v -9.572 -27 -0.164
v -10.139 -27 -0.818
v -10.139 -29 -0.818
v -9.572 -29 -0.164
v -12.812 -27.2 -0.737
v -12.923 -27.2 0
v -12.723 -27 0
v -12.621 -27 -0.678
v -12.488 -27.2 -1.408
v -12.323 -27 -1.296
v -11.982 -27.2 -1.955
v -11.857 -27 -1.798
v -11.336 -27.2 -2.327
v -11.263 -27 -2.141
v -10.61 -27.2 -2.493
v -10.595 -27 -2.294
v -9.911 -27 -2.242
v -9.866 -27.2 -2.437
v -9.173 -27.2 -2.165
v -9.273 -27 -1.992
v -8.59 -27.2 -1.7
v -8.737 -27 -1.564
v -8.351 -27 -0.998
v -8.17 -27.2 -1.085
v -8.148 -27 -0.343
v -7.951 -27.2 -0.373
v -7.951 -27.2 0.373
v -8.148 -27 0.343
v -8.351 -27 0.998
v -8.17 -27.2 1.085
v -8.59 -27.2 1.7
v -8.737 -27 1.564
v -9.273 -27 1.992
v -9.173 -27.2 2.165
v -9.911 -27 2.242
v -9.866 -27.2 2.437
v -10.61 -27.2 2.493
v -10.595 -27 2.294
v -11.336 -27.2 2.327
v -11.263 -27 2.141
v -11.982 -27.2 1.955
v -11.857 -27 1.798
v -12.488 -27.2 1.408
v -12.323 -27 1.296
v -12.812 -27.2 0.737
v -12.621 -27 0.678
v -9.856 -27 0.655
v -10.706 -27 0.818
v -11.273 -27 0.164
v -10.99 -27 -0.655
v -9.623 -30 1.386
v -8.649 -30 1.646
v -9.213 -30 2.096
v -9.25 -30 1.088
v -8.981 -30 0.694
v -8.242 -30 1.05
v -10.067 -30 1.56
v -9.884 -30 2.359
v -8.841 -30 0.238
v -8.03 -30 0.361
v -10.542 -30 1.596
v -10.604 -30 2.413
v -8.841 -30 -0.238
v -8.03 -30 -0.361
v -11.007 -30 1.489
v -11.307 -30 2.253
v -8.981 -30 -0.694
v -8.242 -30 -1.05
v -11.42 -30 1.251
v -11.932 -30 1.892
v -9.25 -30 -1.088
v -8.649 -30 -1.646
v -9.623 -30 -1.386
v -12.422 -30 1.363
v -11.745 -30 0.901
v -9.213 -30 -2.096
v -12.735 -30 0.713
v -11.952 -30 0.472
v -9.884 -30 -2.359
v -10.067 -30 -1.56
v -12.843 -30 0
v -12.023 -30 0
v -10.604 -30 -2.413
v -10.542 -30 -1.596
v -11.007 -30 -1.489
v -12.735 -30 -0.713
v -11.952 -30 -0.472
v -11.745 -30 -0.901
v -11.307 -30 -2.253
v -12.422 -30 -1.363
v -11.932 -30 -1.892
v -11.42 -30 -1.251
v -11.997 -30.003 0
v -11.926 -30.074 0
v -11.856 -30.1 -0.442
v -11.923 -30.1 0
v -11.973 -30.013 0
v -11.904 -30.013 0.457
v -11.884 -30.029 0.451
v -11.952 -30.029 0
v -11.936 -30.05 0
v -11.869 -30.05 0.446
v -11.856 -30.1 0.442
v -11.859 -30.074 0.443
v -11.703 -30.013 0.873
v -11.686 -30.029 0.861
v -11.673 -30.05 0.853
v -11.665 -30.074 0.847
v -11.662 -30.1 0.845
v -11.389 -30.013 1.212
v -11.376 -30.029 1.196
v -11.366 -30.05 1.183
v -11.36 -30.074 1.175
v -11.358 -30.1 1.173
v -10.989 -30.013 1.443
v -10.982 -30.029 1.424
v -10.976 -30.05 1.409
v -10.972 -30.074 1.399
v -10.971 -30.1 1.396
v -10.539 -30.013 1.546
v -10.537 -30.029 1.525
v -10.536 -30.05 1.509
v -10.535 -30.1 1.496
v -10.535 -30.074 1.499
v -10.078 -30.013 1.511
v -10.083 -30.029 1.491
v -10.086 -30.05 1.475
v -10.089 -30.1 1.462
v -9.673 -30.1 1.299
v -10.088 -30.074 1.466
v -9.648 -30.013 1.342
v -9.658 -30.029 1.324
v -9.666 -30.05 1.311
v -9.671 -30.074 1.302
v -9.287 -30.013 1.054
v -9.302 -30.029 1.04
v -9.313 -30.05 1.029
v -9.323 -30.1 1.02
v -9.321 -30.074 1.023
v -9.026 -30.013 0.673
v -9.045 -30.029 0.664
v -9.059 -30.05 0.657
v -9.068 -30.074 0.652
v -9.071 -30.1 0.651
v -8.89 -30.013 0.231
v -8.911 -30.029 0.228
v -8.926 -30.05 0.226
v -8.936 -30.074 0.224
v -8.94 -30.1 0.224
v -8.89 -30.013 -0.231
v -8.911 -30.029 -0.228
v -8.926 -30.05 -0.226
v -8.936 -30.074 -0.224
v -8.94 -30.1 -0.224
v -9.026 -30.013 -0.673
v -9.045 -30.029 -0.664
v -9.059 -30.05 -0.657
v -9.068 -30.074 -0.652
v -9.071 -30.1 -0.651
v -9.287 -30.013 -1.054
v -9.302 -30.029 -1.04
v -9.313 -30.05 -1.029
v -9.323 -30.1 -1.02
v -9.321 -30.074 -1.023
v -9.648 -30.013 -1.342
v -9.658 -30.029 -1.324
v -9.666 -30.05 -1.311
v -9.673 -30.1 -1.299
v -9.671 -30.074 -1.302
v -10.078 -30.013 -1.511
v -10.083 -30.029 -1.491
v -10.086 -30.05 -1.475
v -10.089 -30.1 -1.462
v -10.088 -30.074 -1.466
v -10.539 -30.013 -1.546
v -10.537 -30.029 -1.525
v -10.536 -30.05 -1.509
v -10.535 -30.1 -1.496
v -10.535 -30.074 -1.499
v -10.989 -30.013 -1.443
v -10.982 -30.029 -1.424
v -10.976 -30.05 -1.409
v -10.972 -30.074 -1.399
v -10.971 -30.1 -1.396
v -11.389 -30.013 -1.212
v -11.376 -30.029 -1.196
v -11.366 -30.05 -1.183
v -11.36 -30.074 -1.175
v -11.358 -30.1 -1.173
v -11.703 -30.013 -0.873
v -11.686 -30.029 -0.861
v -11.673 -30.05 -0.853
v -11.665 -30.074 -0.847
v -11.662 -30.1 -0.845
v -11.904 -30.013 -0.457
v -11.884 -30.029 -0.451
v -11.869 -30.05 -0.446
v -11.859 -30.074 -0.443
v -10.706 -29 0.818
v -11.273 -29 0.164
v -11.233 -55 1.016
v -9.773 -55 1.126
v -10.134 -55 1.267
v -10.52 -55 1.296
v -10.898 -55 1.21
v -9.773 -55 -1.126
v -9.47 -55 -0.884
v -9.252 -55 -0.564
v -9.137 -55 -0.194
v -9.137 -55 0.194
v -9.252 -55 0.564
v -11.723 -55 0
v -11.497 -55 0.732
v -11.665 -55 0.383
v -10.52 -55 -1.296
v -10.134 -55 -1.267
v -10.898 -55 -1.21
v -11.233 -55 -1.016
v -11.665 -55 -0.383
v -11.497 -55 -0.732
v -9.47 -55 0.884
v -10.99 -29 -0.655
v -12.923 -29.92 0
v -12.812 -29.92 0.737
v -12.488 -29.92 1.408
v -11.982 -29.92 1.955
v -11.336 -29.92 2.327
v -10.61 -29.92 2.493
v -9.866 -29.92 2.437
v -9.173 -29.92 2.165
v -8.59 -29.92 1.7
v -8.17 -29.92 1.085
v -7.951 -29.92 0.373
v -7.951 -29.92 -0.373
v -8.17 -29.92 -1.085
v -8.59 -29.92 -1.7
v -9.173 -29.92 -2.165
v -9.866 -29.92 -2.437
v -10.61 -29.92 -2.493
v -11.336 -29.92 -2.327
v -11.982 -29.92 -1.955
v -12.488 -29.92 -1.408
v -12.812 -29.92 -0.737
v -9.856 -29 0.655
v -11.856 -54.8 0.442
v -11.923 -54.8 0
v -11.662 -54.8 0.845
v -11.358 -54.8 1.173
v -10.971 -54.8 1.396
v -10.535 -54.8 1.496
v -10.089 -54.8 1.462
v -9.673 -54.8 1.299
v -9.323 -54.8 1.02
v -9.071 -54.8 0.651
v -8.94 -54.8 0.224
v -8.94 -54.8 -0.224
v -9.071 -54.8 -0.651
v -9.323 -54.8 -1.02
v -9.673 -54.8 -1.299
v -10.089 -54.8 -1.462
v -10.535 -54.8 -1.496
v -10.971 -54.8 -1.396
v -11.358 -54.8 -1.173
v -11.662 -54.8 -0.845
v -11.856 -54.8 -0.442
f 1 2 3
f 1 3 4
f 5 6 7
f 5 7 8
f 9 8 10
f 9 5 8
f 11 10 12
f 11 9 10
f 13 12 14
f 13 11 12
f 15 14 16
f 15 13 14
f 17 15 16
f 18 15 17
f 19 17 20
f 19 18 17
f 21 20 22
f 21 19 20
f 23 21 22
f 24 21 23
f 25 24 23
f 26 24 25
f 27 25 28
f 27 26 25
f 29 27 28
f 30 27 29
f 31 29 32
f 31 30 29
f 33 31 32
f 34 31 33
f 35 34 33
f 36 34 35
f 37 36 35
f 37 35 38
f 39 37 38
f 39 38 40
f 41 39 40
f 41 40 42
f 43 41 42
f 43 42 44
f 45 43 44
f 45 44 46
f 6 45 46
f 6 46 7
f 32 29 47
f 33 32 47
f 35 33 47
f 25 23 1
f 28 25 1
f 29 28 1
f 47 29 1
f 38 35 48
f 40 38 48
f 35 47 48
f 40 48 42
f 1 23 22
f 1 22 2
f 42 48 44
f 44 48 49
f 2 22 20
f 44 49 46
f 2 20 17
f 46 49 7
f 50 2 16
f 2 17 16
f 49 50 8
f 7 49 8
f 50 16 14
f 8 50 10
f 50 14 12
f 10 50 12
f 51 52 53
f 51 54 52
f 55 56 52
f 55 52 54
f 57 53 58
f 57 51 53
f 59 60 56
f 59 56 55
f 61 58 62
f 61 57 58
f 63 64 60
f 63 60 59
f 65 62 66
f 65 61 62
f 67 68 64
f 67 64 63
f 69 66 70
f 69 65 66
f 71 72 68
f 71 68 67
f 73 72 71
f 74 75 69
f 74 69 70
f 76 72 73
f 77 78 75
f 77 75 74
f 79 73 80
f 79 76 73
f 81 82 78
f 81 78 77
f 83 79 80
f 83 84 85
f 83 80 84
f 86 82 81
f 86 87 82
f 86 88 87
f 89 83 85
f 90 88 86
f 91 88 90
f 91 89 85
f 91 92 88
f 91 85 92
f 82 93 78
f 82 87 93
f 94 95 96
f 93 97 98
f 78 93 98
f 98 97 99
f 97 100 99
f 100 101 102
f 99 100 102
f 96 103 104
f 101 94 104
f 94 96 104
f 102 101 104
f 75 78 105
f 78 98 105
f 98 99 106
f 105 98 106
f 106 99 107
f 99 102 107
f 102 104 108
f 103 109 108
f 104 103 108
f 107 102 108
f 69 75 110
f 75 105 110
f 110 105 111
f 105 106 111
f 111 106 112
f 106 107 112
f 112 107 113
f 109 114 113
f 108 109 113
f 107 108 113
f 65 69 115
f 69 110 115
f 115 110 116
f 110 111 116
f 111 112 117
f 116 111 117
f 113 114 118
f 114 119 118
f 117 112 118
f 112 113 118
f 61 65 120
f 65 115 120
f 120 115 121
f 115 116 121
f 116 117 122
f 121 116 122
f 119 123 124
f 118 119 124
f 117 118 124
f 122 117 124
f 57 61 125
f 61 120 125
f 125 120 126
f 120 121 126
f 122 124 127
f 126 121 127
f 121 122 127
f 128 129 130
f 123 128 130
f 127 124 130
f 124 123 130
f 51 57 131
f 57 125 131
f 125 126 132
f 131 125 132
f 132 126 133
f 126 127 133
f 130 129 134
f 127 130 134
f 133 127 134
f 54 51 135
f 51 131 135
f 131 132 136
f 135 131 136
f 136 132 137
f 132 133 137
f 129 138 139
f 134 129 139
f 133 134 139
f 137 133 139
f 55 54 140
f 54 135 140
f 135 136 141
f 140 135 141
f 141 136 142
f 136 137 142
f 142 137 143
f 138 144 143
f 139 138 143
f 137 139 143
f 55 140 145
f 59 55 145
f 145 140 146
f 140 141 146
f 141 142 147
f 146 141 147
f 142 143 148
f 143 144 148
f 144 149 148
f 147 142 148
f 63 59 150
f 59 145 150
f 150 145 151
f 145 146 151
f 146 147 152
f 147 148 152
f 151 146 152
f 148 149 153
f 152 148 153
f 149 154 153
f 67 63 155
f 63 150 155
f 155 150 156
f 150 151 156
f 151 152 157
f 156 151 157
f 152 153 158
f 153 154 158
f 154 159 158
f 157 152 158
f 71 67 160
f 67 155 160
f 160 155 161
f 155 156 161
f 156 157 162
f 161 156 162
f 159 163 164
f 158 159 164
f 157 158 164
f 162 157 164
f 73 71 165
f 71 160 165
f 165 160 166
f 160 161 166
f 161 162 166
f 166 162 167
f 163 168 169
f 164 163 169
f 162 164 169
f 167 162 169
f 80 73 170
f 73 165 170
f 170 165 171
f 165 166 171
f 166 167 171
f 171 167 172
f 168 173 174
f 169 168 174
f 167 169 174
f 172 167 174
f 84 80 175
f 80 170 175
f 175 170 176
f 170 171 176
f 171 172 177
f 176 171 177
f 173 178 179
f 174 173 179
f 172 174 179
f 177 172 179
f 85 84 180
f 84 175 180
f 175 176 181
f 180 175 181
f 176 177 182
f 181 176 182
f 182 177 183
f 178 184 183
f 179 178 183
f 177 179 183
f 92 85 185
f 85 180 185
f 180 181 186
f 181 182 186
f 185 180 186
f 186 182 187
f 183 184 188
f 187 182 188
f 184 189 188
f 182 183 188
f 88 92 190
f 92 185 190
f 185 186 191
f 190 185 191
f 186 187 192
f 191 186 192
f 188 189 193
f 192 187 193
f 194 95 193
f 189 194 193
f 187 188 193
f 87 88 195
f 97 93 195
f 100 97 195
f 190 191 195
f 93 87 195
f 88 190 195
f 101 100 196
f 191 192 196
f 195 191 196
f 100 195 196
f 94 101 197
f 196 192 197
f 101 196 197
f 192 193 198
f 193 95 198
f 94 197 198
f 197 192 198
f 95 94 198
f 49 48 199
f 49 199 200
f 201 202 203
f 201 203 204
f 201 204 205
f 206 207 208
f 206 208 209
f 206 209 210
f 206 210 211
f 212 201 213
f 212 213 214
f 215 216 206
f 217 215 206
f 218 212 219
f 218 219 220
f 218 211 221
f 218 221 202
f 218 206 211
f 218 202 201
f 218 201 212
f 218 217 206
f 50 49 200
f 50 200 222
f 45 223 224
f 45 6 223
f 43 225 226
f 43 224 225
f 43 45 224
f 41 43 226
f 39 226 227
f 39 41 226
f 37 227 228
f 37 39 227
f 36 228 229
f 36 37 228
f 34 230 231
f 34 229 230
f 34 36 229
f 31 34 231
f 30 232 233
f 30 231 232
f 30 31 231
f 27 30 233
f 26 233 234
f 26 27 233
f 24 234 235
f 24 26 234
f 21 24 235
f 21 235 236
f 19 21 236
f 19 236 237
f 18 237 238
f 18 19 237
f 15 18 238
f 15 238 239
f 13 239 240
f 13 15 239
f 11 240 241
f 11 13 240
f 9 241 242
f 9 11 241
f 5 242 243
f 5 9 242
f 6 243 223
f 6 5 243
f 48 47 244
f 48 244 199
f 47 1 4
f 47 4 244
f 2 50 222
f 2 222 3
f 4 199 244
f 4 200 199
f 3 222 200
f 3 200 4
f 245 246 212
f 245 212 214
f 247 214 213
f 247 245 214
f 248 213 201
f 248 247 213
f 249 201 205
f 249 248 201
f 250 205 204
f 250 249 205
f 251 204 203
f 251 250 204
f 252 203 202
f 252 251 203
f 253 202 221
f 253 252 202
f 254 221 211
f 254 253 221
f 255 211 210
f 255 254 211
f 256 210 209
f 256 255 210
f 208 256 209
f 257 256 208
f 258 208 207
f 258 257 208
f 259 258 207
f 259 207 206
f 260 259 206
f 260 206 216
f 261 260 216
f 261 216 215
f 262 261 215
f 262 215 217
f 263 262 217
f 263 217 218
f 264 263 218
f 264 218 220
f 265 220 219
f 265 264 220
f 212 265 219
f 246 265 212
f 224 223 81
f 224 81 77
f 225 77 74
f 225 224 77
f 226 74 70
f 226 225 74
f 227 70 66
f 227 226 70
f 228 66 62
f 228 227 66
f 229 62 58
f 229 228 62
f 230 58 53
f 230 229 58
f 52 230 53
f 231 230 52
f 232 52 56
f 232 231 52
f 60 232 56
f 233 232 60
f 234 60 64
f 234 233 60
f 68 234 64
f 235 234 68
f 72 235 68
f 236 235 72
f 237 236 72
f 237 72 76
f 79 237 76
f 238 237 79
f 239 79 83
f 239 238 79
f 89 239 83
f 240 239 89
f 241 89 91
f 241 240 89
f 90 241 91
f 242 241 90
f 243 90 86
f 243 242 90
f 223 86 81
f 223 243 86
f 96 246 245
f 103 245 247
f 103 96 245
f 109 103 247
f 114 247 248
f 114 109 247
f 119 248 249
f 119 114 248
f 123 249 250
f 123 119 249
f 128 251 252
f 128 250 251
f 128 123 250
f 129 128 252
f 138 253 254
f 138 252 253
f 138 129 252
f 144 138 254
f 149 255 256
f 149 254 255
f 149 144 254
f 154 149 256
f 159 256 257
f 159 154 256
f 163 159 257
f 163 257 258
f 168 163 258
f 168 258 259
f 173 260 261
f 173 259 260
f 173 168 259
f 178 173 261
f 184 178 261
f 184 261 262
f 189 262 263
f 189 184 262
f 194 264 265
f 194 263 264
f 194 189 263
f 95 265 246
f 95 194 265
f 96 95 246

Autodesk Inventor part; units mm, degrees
ref_plane "YZ Plane" through (0, 0, 0) normal (1, 0, 0) x (0, 1, 0)
ref_plane "XZ Plane" through (0, 0, 0) normal (0, 1, 0) x (-1, 0, 0)
ref_plane "XY Plane" through (0, 0, 0) normal (0, 0, 1) x (1, 0, 0)
sketch "Sketch1" plane through (0, 0, 0) normal (0, 0, 1) x (1, 0, 0)
  line L0 (-10.4228, -30) -> (-12.9228, -30)
  line L1 (-12.9228, -30) -> (-12.9228, -27)
  line L2 (-12.9228, -27) -> (-10.4228, -27)
  line L3 (-10.4228, -27) -> (-10.4228, -30)
  line L4 (-10.4228, -30) -> (-10.4228, -55)
  line L5 (-10.4228, -55) -> (-11.9228, -55)
  line L6 (-11.9228, -55) -> (-11.9228, -30)
  point P0 (0, 0)
  dimension "d0" = 2.5
  dimension "d1" = 3
  dimension "d3" = 1.5
  dimension "d16" = 25
revolve "Revolution1" add sketch "Sketch1" angle 360 about axis through (-10.4228, -30, 0) along (0, -1, 0)
chamfer "Chamfer1" distance 0.2 angle 45 1 edges at (-7.9228, -27, 0)
sketch "Boceto2" plane through (-10.4228, -27, 0) normal (0, 1, 0) x (1, 0, 0)
  line L0 (0.5669, -0.6547) -> (-0.2835, -0.8183)
  line L1 (-0.2835, -0.8183) -> (-0.8504, -0.1636)
  line L2 (-0.8504, -0.1636) -> (-0.5669, 0.6547)
  line L3 (-0.5669, 0.6547) -> (0.2835, 0.8183)
  line L4 (0.2835, 0.8183) -> (0.8504, 0.1636)
  line L5 (0.8504, 0.1636) -> (0.5669, -0.6547)
  point P0 (10.4228, 0)
  point P1 (0, 0)
  dimension "d11" = 1.5
extrude "Extrusión1" cut sketch "Boceto2" against normal blind 2
fillet "Fillet1" radius 0.1 1 edges at (-8.9228, -30, 0)
chamfer "Chamfer3" distance 0.2 angle 45 1 edges at (-8.9228, -55, 0)
chamfer "Chamfer4" distance 0.08 angle 45 1 edges at (-7.9228, -30, 0)
thread "Thread3" size "M3x0.5" class "6g" standard "ISO Metric profile" length 70
properties part number "Tornillo Allen cabeza cilindrica M3x20mm"
